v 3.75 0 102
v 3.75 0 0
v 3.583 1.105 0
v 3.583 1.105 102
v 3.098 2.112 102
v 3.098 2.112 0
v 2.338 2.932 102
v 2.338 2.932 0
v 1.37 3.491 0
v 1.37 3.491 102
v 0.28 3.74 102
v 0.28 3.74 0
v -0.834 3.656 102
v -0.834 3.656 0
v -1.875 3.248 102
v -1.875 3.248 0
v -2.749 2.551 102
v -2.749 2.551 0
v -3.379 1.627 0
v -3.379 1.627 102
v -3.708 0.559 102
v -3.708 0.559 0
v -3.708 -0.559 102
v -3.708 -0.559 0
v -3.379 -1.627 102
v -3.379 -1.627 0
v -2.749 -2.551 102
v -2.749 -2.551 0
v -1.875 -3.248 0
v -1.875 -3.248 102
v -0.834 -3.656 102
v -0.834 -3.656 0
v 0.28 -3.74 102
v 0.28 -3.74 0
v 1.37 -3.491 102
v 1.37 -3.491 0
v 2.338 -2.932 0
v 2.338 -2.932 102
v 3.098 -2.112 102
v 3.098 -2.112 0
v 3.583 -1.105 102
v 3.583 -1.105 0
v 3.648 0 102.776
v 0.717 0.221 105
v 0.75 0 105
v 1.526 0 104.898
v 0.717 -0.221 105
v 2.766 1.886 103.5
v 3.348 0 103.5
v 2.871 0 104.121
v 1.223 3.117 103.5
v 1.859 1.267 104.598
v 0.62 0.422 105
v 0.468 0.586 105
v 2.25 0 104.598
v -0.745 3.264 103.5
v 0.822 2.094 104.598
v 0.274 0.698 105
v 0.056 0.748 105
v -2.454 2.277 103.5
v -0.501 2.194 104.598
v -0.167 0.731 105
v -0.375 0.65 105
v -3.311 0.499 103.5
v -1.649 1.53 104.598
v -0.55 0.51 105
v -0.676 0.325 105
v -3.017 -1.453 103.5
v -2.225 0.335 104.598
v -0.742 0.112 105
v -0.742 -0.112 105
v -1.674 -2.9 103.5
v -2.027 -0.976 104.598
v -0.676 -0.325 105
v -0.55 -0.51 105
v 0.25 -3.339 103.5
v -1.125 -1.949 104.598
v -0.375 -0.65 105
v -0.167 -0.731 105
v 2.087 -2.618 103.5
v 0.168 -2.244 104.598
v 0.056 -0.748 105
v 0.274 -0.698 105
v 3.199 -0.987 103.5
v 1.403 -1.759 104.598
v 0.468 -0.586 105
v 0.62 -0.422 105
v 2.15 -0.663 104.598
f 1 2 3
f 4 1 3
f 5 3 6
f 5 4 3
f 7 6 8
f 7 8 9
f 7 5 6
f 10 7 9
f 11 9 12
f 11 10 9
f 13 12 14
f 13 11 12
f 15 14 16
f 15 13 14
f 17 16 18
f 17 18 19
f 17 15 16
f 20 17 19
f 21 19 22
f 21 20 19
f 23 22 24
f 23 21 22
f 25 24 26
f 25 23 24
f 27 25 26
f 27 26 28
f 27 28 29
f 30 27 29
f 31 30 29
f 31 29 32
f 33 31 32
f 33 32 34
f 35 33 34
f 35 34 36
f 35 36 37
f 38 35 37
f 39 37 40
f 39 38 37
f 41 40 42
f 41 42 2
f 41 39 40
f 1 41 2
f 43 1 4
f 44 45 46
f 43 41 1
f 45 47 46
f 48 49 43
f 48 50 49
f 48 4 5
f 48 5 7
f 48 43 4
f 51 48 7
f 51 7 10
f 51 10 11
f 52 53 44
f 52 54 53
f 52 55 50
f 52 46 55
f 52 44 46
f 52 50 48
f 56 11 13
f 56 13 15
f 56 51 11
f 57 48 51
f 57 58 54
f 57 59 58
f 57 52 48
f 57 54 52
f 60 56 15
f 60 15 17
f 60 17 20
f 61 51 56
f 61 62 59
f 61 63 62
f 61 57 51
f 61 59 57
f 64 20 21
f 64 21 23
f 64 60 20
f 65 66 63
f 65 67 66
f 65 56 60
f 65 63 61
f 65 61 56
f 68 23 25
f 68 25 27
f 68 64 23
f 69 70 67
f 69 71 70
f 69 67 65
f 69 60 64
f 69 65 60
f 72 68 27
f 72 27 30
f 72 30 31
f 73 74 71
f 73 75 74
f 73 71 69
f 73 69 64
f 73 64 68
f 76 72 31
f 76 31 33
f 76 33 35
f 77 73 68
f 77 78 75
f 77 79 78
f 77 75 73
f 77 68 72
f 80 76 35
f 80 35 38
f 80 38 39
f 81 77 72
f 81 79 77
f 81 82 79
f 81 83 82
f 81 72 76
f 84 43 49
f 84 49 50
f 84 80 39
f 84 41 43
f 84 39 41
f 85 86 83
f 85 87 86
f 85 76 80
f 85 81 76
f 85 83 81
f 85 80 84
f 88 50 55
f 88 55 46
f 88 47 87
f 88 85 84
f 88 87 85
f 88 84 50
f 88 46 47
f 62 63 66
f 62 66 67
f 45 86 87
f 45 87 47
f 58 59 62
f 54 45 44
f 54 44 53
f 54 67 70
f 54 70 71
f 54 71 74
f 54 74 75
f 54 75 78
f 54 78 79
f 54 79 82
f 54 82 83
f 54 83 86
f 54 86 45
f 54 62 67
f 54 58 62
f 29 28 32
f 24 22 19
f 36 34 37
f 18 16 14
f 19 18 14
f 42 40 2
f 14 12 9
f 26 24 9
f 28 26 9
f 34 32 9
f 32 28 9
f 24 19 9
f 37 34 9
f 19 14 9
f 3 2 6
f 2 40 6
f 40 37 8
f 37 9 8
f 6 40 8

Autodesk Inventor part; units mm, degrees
ref_plane "YZ Plane" through (0, 0, 0) normal (1, 0, 0) x (0, 1, 0)
ref_plane "XZ Plane" through (0, 0, 0) normal (0, 1, 0) x (-1, 0, 0)
ref_plane "XY Plane" through (0, 0, 0) normal (0, 0, 1) x (1, 0, 0)
sketch "Sketch1" plane through (0, 0, 0) normal (0, 0, 1) x (1, 0, 0)
  circle A0 centre (0, 0) radius 2.5
  dimension "d0" = 5
extrude "Extrusion1" add sketch "Sketch1" along normal blind 105
sketch "Sketch2" plane through (0, 0, 105) normal (0, 0, 1) x (1, 0, 0)
  circle A0 centre (0, 0) radius 2.5 projected
  circle A1 centre (0, 0) radius 2.5
  circle A2 centre (0, 0) radius 3.75
  dimension "d3" = 7.5
extrude "Extrusion2" add sketch "Sketch2" against normal blind 105
fillet "Fillet1" radius 3 1 edges at (-3.75, 0, 105)
properties part number "Line"
